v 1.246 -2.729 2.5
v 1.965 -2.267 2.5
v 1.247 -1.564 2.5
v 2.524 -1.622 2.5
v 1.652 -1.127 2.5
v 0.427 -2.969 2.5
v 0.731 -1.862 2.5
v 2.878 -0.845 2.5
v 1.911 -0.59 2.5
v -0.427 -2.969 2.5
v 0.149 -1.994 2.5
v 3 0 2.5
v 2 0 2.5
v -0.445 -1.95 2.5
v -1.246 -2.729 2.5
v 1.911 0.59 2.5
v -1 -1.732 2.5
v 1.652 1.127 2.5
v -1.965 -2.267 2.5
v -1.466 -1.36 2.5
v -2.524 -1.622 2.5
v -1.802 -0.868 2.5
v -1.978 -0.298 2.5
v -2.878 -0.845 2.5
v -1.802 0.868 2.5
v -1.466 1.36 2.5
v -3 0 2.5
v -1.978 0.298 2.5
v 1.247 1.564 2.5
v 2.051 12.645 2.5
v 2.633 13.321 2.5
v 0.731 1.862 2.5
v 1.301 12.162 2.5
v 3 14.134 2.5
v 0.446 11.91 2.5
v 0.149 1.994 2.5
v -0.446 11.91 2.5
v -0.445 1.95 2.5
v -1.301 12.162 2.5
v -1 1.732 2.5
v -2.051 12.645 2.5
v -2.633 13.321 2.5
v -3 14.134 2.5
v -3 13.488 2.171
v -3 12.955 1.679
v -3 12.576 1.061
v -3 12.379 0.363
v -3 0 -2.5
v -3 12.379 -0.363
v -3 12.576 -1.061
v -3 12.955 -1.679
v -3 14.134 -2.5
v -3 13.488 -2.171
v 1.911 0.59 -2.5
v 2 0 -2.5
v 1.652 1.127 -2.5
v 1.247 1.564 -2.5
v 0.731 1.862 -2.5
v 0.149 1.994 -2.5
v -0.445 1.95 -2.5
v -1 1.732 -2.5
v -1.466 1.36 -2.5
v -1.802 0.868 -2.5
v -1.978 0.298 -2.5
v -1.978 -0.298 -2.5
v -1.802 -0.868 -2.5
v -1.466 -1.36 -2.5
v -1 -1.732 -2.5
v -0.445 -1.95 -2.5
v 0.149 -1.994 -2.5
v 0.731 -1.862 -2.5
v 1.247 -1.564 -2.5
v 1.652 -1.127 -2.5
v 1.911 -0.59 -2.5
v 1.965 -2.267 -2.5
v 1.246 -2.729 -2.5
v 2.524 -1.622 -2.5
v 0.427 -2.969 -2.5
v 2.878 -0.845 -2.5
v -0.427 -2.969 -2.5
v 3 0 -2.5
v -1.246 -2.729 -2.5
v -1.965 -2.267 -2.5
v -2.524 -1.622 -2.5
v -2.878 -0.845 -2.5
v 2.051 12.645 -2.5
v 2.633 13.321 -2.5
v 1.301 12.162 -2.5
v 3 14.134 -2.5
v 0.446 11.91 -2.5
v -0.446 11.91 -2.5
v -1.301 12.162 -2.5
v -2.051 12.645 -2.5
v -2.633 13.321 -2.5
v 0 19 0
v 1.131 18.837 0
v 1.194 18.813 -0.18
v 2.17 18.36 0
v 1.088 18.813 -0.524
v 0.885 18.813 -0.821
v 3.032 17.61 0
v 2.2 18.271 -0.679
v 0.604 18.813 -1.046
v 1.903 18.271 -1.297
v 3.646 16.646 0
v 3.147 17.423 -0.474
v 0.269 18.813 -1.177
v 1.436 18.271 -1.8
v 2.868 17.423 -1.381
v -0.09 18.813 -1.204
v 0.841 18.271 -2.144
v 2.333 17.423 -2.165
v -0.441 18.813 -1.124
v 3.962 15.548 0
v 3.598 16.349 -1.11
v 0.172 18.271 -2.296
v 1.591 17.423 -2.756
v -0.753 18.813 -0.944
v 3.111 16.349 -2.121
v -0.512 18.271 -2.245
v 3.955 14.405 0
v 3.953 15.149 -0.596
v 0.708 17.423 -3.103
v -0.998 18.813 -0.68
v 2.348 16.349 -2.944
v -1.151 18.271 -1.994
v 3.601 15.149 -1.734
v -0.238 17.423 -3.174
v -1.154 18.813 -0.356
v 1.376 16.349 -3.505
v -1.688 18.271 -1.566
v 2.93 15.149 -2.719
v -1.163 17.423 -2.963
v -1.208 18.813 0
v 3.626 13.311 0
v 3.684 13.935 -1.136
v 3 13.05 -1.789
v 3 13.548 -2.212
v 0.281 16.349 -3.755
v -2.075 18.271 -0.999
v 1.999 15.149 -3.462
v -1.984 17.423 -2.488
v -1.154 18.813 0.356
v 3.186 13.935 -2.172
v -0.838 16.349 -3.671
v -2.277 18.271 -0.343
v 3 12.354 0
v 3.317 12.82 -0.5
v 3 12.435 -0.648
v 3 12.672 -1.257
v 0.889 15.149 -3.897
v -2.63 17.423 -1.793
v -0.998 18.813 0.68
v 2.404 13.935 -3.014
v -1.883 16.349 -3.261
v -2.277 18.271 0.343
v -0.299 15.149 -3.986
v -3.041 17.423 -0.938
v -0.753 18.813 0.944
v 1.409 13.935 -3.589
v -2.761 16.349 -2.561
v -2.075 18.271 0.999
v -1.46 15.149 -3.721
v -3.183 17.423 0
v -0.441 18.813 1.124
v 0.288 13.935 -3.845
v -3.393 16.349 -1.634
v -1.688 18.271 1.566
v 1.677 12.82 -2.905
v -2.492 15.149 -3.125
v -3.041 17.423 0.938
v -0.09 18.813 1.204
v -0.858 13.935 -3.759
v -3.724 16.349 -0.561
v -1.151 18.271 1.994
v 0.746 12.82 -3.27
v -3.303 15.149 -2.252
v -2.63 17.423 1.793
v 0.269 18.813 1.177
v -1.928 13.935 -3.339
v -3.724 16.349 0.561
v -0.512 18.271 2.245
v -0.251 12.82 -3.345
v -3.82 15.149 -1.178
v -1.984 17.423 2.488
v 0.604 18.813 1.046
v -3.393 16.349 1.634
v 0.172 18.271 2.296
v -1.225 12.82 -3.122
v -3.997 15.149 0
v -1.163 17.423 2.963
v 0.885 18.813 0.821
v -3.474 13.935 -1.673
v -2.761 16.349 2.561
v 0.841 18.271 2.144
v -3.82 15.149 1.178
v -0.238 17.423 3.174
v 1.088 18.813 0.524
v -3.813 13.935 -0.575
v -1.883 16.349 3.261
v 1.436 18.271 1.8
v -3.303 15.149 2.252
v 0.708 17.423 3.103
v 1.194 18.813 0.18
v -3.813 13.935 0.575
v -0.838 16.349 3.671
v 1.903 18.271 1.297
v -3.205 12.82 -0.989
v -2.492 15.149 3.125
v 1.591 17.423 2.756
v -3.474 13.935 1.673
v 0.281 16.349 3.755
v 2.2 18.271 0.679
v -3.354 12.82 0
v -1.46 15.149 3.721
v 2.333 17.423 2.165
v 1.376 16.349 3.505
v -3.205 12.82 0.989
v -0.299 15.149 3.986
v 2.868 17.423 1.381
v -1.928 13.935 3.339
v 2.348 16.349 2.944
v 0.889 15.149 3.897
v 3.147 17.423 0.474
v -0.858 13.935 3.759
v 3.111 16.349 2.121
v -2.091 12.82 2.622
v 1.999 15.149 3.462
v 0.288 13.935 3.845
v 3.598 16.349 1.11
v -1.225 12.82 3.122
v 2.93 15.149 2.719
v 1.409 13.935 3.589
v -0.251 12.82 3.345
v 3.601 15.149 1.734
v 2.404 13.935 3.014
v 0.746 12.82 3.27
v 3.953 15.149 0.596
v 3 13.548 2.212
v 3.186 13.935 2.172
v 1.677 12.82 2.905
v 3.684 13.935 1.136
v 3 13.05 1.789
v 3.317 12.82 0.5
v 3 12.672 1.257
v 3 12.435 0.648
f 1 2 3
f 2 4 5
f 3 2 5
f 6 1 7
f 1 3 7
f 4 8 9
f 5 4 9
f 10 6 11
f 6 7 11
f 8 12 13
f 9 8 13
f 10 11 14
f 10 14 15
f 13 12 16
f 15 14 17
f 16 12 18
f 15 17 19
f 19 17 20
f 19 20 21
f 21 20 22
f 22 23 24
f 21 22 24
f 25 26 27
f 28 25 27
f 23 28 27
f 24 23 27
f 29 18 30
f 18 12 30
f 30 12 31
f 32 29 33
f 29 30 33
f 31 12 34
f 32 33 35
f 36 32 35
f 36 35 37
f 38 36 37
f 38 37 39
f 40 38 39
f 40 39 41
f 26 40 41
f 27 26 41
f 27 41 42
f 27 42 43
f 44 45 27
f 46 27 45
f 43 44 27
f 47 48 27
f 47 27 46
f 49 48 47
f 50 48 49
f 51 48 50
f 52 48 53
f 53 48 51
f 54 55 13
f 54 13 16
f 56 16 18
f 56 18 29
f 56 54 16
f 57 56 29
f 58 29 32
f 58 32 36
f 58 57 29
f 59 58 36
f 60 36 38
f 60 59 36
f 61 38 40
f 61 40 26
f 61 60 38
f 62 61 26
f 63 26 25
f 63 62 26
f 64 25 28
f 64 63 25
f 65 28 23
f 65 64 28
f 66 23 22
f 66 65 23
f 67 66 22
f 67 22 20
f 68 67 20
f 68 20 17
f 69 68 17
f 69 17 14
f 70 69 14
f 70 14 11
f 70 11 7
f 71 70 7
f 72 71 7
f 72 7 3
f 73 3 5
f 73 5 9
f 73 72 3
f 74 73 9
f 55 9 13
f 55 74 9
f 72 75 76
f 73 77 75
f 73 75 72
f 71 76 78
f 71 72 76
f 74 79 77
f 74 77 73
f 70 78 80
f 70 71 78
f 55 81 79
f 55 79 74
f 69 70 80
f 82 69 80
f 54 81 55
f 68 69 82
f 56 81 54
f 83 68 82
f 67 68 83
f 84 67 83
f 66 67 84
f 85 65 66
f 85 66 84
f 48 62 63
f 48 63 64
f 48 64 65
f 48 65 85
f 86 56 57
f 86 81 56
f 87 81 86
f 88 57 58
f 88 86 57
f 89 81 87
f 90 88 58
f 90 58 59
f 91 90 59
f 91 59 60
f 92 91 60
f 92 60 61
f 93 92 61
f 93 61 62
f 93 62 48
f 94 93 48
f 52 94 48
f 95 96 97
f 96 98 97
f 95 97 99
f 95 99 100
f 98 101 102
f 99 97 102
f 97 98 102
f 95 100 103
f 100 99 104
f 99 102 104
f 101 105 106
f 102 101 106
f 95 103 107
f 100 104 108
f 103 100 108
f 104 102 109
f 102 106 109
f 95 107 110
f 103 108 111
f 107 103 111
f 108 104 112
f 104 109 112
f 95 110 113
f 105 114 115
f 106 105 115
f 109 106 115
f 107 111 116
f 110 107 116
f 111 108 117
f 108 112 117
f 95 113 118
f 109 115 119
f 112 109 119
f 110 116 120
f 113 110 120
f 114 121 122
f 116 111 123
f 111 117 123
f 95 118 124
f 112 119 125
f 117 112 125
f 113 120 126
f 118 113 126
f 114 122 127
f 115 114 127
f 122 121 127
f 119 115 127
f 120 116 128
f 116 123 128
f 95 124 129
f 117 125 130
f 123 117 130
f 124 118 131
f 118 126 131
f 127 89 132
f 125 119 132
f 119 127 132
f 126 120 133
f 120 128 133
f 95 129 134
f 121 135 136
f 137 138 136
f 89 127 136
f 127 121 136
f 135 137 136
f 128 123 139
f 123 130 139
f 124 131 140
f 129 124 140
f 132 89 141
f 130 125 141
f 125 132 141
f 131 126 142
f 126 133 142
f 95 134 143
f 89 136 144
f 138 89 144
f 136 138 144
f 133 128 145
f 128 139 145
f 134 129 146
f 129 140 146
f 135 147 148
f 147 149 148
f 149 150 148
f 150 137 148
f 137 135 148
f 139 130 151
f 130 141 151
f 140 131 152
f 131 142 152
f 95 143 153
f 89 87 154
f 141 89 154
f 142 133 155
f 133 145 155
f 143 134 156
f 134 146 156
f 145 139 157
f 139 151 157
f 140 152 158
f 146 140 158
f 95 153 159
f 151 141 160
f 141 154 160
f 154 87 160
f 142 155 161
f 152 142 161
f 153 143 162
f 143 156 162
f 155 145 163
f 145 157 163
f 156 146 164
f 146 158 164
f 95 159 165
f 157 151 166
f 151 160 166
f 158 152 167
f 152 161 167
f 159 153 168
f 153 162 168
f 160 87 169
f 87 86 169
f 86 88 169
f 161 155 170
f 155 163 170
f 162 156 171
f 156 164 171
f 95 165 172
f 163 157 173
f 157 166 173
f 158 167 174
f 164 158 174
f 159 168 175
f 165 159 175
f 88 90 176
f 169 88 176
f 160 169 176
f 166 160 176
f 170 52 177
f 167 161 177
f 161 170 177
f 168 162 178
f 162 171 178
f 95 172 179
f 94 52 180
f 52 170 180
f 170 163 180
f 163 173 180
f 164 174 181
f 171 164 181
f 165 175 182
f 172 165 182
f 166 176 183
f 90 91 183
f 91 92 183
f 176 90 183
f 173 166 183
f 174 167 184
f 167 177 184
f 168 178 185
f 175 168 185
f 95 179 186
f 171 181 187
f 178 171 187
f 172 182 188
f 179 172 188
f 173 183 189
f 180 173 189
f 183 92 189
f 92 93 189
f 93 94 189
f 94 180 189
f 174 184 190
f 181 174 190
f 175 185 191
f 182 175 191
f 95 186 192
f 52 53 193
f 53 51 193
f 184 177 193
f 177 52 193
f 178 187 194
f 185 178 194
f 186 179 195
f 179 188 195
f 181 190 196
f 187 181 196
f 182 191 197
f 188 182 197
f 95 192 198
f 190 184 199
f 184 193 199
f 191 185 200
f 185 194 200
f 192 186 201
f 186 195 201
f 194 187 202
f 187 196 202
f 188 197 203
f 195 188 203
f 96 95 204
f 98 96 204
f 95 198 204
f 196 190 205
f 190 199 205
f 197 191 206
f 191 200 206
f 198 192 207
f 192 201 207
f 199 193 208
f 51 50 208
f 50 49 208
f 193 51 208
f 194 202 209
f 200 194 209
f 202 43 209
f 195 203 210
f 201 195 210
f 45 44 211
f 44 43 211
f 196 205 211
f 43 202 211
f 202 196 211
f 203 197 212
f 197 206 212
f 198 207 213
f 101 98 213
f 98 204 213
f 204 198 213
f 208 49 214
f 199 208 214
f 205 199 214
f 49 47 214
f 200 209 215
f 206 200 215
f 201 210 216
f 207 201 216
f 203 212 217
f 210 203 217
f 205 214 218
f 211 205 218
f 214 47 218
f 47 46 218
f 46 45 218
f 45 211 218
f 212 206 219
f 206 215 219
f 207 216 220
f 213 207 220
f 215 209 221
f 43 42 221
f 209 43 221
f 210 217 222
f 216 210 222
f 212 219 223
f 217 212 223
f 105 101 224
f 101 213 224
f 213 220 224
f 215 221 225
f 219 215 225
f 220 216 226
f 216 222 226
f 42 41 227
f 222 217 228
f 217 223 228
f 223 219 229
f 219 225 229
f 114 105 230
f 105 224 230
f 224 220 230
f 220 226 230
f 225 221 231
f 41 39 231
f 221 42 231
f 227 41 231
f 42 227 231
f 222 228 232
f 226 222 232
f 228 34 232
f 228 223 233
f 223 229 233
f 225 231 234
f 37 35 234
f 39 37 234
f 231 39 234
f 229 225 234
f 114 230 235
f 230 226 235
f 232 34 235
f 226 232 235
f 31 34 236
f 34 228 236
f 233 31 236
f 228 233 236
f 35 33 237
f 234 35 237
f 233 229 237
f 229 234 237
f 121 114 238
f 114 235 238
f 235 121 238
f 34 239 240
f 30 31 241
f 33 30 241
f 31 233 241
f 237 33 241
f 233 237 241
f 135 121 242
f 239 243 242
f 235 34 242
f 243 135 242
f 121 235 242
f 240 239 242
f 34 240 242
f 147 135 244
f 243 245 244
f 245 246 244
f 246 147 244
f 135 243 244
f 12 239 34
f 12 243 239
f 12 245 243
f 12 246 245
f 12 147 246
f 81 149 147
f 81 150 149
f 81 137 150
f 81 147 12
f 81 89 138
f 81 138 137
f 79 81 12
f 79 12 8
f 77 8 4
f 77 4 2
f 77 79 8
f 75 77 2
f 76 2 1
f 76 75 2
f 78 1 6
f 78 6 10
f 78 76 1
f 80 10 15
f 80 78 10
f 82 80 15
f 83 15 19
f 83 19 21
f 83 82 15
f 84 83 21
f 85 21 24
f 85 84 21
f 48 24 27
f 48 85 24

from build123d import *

# Parameters (mm, degrees)
SALIENTE_EXTRUIR1_DEPTH      = 2.5
SALIENTE_EXTRUIR1_DEPTH_BACK = 2.5
CROQUIS1_R                   = 2


with BuildPart() as part:
    # Croquis1 → Saliente-Extruir1 (new, two sides: drawn at the far end of the back side and taken through both)
    with BuildSketch(Plane.XY.offset(-SALIENTE_EXTRUIR1_DEPTH_BACK)):
        with BuildLine():
            Line((3, 15), (3, 0))
            ThreePointArc((3, 0), (0, -3), (-3, 0))
            Line((-3, 0), (-3, 15))
            ThreePointArc((-3, 15), (0, 18), (3, 15))
        make_face()
        Circle(CROQUIS1_R, mode=Mode.SUBTRACT)
        with Locations((0, 15)):
            Circle(CROQUIS1_R, mode=Mode.SUBTRACT)
    extrude(amount=SALIENTE_EXTRUIR1_DEPTH + SALIENTE_EXTRUIR1_DEPTH_BACK)

    # Croquis2 → Revolución1 (revolve)
    with BuildSketch(Plane.XY):
        with BuildLine():
            Line((0, 11), (0, 19))
            ThreePointArc((0, 19), (4, 15), (0, 11))
        make_face()
    revolve(axis=Axis((0, 11, 0), (0, 1, 0)))


solid = part.part
